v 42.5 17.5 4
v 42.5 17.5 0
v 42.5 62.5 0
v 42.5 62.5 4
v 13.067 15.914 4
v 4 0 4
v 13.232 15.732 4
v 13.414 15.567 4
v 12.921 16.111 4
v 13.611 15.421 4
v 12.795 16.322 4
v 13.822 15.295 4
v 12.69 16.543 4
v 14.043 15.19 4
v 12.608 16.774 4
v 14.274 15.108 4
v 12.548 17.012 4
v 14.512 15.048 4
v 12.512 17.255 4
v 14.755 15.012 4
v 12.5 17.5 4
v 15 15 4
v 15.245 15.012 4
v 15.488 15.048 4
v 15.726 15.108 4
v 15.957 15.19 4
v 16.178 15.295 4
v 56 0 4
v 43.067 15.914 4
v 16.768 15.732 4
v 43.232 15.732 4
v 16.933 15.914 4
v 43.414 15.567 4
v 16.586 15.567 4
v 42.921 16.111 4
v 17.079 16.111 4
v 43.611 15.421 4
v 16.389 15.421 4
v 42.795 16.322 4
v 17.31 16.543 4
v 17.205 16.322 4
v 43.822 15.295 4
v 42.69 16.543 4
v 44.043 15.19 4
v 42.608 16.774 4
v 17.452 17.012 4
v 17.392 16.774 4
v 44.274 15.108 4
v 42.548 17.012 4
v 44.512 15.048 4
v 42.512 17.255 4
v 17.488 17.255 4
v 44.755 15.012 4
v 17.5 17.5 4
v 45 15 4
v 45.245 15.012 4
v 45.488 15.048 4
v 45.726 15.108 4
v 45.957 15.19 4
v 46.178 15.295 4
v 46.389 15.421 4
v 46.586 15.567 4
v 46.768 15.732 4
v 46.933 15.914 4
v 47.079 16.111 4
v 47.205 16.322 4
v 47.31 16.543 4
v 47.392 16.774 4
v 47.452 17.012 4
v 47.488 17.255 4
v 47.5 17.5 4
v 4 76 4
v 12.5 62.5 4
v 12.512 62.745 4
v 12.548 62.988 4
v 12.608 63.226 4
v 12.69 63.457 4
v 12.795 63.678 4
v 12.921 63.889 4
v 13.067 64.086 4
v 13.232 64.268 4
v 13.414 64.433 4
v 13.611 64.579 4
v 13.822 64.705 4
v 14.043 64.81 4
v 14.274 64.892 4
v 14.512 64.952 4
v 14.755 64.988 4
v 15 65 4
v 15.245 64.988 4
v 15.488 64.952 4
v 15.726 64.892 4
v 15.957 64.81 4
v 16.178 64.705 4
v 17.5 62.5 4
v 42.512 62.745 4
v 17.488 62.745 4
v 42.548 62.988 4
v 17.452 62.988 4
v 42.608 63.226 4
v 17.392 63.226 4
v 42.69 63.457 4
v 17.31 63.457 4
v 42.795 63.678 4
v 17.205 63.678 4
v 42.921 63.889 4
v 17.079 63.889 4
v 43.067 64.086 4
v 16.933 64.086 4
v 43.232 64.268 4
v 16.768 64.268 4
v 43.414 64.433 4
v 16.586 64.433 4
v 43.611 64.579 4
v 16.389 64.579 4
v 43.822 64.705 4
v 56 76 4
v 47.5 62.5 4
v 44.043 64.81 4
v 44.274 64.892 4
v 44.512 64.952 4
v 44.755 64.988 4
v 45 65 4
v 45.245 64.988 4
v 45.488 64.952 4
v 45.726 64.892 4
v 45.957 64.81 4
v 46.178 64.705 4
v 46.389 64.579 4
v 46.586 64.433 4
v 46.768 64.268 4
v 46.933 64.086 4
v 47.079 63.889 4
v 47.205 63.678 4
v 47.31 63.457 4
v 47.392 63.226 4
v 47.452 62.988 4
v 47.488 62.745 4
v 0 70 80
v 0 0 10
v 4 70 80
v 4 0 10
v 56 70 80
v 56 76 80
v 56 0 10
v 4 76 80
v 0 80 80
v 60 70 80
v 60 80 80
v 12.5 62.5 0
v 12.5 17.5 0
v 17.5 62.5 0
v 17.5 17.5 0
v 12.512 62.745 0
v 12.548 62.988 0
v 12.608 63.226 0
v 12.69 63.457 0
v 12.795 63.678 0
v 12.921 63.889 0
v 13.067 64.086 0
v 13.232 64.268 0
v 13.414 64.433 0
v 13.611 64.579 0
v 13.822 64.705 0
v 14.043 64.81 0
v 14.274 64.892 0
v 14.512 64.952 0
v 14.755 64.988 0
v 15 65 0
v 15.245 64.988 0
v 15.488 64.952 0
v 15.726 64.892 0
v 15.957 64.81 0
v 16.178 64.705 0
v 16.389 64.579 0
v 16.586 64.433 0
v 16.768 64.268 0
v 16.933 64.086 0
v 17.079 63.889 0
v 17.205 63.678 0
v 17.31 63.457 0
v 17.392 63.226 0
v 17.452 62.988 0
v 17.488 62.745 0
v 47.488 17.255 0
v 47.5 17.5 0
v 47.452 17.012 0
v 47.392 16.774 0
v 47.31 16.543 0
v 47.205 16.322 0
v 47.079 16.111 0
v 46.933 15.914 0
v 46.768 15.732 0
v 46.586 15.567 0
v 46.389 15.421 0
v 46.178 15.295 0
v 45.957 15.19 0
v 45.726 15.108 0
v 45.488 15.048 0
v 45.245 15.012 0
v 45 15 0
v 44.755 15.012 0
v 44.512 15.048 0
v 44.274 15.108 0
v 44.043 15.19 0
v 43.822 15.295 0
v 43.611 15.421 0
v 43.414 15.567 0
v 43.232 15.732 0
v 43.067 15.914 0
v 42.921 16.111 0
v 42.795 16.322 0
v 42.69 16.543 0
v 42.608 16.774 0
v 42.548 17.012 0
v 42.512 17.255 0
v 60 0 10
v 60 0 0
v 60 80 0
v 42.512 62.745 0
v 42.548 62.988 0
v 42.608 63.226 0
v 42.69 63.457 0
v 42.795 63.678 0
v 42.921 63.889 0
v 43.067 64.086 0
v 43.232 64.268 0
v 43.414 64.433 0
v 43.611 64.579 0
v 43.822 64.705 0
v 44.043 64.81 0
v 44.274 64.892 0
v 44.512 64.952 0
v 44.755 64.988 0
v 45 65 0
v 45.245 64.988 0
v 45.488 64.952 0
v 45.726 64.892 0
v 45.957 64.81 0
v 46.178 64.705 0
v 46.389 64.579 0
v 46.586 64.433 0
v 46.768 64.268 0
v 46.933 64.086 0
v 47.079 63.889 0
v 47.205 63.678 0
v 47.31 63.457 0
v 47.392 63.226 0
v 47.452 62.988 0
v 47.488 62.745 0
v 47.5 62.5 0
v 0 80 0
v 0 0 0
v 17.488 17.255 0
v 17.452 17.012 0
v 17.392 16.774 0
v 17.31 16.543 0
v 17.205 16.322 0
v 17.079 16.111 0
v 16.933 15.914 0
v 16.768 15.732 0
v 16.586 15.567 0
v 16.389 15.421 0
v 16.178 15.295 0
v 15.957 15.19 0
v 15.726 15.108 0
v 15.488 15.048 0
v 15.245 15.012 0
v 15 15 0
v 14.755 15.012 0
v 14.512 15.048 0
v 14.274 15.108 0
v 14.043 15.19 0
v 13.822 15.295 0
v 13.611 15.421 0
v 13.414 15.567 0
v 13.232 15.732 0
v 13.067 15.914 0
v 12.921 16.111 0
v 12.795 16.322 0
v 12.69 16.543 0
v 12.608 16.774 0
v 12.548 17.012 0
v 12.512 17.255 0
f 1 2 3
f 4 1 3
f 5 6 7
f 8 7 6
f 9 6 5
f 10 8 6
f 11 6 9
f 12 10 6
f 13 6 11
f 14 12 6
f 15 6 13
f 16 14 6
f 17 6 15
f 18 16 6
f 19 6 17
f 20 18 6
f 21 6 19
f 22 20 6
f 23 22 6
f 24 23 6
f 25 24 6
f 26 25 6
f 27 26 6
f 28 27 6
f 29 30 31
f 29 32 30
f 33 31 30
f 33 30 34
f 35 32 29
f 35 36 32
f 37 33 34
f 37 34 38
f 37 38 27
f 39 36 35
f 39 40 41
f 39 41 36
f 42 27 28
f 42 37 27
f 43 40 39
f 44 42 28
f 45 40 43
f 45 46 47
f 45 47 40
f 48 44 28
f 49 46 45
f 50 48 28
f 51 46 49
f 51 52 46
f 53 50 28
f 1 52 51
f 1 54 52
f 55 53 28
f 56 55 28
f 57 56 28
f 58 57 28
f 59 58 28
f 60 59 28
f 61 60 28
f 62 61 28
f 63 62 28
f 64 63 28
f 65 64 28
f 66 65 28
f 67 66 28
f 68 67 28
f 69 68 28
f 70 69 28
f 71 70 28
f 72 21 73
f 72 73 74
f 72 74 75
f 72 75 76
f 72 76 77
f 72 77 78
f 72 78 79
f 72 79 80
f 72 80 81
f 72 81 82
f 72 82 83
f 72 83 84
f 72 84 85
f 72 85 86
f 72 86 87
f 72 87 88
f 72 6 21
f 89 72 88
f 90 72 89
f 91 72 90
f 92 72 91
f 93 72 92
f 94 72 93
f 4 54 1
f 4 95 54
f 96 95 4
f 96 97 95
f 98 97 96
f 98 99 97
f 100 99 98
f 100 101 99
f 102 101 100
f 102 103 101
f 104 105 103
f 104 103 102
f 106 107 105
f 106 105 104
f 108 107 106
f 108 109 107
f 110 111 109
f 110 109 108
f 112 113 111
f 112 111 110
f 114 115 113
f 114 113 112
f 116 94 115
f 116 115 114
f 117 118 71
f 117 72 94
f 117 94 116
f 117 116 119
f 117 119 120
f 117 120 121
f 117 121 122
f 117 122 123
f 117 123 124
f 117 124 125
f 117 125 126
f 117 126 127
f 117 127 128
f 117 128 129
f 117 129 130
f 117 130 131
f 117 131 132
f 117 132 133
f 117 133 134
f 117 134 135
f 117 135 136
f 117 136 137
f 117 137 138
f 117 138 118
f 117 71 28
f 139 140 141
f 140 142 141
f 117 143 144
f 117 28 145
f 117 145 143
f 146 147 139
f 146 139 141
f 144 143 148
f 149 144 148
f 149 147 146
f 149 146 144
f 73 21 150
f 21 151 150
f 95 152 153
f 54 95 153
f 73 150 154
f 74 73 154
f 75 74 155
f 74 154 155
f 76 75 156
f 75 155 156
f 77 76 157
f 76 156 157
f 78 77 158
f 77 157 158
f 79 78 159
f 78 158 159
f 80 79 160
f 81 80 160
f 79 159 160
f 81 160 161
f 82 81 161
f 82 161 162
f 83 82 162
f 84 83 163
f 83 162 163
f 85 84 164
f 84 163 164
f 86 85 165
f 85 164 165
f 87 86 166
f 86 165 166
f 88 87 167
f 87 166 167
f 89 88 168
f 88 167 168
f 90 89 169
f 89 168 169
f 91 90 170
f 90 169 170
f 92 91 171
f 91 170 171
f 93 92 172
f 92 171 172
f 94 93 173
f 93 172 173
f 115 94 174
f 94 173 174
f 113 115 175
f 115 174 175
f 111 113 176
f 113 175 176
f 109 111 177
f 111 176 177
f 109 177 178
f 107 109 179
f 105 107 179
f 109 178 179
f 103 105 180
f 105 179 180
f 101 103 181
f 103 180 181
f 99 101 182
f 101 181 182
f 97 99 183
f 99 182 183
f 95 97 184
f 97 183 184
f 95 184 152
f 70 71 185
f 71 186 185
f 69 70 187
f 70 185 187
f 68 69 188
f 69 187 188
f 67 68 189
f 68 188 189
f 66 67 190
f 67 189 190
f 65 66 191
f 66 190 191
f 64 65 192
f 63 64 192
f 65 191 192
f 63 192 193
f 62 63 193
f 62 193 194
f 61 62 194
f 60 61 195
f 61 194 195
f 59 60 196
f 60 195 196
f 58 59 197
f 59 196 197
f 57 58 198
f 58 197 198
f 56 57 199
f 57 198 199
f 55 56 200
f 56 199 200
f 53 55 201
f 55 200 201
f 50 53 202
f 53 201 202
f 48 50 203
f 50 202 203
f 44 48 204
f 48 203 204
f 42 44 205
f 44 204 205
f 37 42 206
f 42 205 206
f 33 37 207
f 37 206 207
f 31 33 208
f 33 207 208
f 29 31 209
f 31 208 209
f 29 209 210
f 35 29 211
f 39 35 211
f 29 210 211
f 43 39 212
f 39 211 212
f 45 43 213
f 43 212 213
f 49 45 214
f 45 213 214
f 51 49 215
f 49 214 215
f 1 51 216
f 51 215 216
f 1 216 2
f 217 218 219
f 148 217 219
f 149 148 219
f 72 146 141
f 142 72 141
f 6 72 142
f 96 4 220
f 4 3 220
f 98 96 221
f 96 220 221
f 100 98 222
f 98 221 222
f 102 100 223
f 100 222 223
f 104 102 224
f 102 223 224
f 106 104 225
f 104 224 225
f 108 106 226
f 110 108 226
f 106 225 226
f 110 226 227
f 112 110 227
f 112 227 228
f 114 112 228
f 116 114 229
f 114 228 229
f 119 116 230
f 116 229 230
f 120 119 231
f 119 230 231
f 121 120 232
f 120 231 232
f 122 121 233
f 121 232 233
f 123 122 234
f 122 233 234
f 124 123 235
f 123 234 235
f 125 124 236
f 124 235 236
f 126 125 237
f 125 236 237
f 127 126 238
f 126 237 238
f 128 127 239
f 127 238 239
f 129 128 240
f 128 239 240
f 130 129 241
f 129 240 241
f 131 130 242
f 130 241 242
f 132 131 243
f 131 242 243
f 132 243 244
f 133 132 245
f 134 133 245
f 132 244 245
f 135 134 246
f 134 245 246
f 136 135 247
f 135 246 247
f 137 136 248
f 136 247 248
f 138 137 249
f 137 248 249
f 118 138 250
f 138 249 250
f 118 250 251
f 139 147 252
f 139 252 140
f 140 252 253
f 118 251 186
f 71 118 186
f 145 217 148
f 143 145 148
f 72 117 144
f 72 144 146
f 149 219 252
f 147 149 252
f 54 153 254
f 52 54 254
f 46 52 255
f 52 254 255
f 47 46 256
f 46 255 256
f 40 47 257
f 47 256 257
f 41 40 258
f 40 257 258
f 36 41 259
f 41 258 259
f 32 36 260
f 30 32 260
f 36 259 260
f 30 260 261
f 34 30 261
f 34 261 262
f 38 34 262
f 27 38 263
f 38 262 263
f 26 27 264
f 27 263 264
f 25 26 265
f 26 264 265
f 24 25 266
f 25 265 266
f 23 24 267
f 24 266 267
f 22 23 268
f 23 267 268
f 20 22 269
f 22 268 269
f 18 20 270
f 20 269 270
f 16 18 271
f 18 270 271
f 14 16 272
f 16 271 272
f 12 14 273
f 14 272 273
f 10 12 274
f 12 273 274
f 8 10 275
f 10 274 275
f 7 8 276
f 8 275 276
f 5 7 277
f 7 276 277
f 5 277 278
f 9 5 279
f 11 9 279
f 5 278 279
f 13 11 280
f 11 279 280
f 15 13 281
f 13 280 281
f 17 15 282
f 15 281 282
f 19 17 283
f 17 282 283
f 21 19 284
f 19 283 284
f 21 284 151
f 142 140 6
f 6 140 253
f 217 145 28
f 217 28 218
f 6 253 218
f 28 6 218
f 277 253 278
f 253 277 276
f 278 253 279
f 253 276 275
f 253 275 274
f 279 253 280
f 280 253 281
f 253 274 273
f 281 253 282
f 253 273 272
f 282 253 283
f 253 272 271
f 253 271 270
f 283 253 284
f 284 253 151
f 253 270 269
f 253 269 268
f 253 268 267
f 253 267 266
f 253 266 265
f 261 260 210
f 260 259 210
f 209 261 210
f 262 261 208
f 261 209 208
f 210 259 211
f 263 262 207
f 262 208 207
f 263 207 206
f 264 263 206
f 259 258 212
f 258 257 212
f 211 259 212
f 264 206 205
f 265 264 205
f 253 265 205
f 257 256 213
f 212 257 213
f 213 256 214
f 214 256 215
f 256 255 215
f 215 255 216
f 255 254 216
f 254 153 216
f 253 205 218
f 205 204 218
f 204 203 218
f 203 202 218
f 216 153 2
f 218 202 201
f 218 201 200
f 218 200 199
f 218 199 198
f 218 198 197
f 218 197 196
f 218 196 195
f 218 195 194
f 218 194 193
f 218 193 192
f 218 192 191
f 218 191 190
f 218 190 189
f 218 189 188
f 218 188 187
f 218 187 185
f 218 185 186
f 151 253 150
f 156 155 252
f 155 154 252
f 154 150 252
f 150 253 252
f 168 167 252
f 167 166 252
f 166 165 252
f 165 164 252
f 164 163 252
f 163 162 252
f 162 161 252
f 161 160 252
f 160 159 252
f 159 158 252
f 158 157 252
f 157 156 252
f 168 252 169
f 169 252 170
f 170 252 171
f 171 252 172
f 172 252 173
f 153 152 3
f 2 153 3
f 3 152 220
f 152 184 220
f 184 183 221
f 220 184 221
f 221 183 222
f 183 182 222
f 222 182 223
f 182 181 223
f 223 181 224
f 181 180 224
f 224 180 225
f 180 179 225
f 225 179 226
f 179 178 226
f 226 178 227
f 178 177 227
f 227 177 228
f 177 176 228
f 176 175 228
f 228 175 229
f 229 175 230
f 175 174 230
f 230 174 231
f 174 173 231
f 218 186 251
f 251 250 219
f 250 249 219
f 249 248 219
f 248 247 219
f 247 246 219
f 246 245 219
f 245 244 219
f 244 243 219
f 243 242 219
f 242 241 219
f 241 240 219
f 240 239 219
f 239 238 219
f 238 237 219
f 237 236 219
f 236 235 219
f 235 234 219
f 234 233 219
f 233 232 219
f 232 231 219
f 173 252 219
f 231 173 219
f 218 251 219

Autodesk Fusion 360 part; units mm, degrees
sketch "Sketch2" plane through (0, 0, 0) normal (0, 0, 1) x (1, 0, 0)
  line L0 (0, 0) -> (60, 0)
  line L1 (60, 0) -> (60, 80)
  line L2 (60, 80) -> (0, 80)
  line L3 (0, 80) -> (0, 0)
  line L4 (56, 0) -> (56, 76)
  line L5 (56, 76) -> (4, 76)
  line L6 (4, 76) -> (4, 0)
  line L7 (15, 65) -> (15, 65)
  line L8 (17.5, 62.5) -> (17.5, 17.5)
  line L9 (15, 15) -> (15, 15)
  line L10 (12.5, 17.5) -> (12.5, 62.5)
  line L11 (45, 65) -> (45, 65)
  line L12 (47.5, 62.5) -> (47.5, 17.5)
  line L13 (45, 15) -> (45, 15)
  line L14 (42.5, 17.5) -> (42.5, 62.5)
  arc A0 (15, 65) -> (12.5, 62.5) centre (15, 62.5) ccw
  arc A1 (17.5, 62.5) -> (15, 65) centre (15, 62.5) ccw
  arc A2 (45, 65) -> (42.5, 62.5) centre (45, 62.5) ccw
  arc A3 (47.5, 62.5) -> (45, 65) centre (45, 62.5) ccw
  arc A4 (12.5, 17.5) -> (15, 15) centre (15, 17.5) ccw
  arc A5 (15, 15) -> (17.5, 17.5) centre (15, 17.5) ccw
  arc A6 (42.5, 17.5) -> (45, 15) centre (45, 17.5) ccw
  arc A7 (45, 15) -> (47.5, 17.5) centre (45, 17.5) ccw
  dimension "d1" = 60
  dimension "d2" = 80
  dimension "d3" = 4
  dimension "d4" = 4
  dimension "d5" = 4
  dimension "d7" = 25
  dimension "d8" = 8.5
  dimension "d9" = 5
  dimension "d10" = 5
  dimension "d14" = 2.5
  dimension "d15" = 2.5
  dimension "d16" = 2.5
  dimension "d17" = 2.5
  dimension "d18" = 2.5
  dimension "d19" = 2.5
  dimension "d20" = 15
extrude "Extrude1" add sketch "Sketch2" along normal blind 4 contours L0 L1 L2 L3 L4 L5 L6 | L0 L4 L5 L6 | L8 L10 A0 A1 A4 A5 | L12 L14 A2 A3 A6 A7
extrude "Extrude2" add sketch "Sketch2" along normal blind 80 contours L0 L1 L2 L3 L4 L5 L6
sketch "Sketch3" plane through (60, 0, 0) normal (1, 0, 0) x (0, 1, 0)
  line L0 (0, 0) -> (80, 0)
  line L1 (80, 0) -> (80, 80)
  line L2 (80, 80) -> (0, 80)
  line L3 (0, 80) -> (0, 0)
  line L4 (0, 10) -> (70, 80)
  dimension "d25" = 10
  dimension "d26" = 10
extrude "Extrude3" cut sketch "Sketch3" against normal blind 95 contours L2 L3 L4
extrude "Extrude4" cut sketch "Sketch2" along normal blind 10 contours L8 L10 A0 A1 A4 A5 | L12 L14 A2 A3 A6 A7
